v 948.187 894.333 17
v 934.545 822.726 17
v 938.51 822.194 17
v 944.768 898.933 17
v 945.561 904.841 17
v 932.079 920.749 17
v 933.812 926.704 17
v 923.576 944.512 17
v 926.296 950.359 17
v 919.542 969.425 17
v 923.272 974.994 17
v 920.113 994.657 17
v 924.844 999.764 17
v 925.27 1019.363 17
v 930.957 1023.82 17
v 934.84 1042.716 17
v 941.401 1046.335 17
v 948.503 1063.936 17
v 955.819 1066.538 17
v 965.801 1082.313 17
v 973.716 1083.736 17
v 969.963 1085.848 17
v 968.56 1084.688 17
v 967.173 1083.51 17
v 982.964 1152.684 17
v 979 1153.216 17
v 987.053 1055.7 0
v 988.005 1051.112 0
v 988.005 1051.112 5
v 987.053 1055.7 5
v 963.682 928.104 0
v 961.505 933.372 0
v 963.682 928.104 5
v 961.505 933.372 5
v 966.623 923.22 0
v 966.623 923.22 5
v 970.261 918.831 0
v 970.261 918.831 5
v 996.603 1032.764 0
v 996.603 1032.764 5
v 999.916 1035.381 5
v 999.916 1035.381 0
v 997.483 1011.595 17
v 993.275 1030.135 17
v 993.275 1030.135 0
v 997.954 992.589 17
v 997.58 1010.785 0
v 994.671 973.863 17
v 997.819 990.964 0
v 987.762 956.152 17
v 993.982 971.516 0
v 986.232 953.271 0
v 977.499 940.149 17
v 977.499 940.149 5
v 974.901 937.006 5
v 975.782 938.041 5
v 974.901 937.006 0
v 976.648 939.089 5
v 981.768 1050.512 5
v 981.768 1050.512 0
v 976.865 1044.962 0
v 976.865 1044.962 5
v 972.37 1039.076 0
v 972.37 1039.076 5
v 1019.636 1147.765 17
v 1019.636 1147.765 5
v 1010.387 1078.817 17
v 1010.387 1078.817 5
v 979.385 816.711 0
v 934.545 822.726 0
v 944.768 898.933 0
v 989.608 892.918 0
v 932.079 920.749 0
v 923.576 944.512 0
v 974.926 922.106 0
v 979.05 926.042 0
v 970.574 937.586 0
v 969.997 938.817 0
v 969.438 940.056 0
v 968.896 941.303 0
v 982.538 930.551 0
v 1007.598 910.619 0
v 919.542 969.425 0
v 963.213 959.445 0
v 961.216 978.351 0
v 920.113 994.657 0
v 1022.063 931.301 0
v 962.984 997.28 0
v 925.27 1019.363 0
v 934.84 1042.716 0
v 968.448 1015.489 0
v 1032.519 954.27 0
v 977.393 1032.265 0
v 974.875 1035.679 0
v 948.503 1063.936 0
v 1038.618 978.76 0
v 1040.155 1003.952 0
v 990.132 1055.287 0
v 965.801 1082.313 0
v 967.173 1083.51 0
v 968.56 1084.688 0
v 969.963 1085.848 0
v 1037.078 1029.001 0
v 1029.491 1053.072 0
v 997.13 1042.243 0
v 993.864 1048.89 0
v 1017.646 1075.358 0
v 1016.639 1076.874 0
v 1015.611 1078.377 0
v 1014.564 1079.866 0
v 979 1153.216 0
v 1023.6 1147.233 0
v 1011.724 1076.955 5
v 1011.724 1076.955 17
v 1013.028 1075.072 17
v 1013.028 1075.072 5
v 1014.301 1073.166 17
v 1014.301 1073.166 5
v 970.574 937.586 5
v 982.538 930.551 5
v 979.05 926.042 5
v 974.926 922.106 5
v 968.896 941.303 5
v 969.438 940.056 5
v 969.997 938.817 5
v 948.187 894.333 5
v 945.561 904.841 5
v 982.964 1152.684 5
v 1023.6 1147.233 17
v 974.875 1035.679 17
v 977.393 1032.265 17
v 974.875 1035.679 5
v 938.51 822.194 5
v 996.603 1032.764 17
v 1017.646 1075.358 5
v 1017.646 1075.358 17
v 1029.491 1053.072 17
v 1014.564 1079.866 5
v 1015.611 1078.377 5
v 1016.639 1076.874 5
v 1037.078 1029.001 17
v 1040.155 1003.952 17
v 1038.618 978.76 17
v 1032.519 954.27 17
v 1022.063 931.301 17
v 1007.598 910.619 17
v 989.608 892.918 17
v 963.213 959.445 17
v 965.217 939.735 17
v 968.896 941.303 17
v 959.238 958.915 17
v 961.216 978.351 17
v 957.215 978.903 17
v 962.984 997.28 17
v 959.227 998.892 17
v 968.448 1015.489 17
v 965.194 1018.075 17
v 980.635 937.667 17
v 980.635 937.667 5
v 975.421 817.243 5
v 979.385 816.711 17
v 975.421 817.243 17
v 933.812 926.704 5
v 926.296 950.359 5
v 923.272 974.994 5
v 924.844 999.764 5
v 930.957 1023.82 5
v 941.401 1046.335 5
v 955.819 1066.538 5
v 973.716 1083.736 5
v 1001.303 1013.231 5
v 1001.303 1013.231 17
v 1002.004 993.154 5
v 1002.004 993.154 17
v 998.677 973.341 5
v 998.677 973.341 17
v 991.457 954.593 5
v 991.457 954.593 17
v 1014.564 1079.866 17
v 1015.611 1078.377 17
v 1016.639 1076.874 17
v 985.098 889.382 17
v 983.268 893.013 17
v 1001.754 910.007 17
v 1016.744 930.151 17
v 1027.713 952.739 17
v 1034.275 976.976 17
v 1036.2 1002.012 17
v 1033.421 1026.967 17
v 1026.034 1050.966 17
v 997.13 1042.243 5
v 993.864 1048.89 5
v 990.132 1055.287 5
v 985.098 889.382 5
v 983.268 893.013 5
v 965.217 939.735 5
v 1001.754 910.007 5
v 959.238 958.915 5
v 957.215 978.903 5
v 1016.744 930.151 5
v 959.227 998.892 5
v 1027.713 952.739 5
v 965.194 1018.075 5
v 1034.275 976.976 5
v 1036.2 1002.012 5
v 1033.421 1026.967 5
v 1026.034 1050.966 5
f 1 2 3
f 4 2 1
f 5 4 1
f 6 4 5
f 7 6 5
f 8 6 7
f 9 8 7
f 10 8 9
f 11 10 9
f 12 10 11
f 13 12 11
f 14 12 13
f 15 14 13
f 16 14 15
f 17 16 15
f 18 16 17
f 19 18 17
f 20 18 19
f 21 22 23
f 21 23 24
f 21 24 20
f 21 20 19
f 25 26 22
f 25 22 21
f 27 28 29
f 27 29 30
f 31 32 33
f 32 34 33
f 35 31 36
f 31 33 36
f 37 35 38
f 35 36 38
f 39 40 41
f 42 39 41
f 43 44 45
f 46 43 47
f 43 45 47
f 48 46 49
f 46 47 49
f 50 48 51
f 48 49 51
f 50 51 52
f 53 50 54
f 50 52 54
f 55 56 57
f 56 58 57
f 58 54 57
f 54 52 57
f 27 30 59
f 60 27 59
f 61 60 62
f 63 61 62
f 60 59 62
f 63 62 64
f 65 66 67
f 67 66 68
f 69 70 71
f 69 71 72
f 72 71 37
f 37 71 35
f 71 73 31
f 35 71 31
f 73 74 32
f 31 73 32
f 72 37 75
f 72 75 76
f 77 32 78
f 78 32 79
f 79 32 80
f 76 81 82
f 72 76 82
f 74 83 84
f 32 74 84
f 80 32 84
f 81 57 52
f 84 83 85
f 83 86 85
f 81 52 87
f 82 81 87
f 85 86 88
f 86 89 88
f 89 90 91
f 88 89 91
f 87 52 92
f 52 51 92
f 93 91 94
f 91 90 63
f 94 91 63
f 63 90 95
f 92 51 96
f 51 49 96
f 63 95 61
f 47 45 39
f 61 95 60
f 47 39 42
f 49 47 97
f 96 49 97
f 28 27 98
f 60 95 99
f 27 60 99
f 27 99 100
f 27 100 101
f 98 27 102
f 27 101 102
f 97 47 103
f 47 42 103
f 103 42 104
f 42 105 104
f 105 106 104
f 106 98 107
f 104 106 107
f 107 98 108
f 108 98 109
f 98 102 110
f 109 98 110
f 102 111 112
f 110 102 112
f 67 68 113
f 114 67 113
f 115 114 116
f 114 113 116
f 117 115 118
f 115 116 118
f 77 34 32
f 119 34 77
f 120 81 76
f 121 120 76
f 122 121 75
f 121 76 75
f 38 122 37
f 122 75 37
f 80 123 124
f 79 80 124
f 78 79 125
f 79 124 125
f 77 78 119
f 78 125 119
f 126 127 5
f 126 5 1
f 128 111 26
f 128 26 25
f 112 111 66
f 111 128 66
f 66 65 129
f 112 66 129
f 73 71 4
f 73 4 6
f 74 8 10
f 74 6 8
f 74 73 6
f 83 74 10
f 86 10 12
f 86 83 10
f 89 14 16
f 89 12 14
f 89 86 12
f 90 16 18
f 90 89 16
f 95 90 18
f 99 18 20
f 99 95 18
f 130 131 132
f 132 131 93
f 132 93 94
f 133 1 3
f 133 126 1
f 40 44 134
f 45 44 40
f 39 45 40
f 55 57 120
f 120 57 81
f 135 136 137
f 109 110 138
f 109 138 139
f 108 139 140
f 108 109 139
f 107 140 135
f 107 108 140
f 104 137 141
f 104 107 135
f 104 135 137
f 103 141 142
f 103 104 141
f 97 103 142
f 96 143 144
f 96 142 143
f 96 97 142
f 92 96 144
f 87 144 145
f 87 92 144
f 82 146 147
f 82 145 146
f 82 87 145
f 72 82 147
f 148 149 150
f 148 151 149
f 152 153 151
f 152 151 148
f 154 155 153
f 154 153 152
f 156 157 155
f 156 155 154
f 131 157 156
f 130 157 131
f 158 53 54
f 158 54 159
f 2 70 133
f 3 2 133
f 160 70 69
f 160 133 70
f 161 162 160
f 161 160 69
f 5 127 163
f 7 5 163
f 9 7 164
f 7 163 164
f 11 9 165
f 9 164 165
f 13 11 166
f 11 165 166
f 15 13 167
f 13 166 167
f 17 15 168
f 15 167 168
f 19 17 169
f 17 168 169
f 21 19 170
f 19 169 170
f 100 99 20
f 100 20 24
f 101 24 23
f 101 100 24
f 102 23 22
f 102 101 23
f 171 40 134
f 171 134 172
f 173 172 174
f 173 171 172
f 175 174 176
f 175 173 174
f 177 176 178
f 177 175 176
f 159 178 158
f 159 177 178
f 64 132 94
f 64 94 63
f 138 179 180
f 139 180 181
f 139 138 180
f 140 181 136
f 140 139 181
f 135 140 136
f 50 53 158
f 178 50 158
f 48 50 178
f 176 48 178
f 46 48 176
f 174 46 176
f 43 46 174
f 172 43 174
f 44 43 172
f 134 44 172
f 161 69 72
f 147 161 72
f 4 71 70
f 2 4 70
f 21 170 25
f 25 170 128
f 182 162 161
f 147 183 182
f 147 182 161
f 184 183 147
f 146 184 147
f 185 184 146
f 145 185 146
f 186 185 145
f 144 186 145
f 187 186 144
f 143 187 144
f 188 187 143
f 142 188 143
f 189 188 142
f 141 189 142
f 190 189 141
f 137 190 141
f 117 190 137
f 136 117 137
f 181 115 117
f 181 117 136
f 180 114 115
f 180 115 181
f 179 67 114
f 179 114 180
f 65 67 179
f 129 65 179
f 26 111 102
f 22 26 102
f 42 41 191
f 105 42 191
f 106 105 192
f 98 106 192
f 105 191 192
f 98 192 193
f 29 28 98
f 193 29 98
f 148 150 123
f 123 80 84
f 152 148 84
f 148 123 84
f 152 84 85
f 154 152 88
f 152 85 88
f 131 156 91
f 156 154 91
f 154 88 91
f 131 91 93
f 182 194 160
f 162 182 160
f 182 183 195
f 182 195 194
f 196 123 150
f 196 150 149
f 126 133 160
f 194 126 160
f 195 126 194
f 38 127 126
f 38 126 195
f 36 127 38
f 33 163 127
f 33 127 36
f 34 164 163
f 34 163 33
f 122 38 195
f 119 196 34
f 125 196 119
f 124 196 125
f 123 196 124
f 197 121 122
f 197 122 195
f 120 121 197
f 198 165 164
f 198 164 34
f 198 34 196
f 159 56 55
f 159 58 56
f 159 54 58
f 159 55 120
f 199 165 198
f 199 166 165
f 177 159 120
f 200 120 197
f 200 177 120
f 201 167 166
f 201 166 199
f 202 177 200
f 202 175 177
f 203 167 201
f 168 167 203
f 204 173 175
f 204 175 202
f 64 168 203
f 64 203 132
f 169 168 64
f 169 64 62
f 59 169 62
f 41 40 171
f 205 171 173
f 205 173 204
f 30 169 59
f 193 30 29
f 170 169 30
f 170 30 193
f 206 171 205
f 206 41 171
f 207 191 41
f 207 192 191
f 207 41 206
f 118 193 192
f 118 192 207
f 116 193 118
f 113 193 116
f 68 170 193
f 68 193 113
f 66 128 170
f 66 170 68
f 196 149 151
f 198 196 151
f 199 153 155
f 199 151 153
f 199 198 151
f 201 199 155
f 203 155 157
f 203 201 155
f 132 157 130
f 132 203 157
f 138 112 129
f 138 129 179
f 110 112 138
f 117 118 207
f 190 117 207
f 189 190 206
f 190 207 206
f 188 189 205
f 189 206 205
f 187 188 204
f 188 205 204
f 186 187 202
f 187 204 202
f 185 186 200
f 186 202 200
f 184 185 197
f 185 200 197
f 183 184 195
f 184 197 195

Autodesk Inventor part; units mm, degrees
ref_plane "YZ Plane" through (0, 0, 0) normal (1, 0, 0) x (0, 1, 0)
ref_plane "XZ Plane" through (0, 0, 0) normal (0, 1, 0) x (-1, 0, 0)
ref_plane "XY Plane" through (0, 0, 0) normal (0, 0, 1) x (1, 0, 0)
sketch "Sketch1" plane through (0, 0, 0) normal (0, 0, 1) x (1, 0, 0)
  arc A0 (967.6192, 924.0732) -> (967.7873, 1075.2272) centre (902.2196, 999.723) ccw
  arc A1 (983.2683, 893.0126) -> (983.4428, 1106.3006) centre (902.2196, 999.723) ccw
  line L0 (965.7611, 927.7614) -> (985.0977, 889.3816)
  line L1 (966.6908, 925.9161) -> (1011.6908, 925.9161) construction
  arc A2 (985.0977, 889.3816) -> (985.2727, 1109.9327) centre (902.2196, 999.723) ccw
  line L2 (965.9281, 1071.5369) -> (985.2727, 1109.9327)
  arc A3 (965.7611, 927.7614) -> (965.9281, 1071.5369) centre (902.2196, 999.723) ccw
  line L3 (977.4986, 940.149) -> (980.6353, 937.6667)
  point P0 (0, 0)
  point P1 (983.9681, 893.1)
  point P2 (990.6031, 1100.4422)
  point P3 (968.1775, 1074.8866)
  dimension "d28" = 100
  dimension "d33" = 63.26
  dimension "d34" = 4
  dimension "d40" = 4
  dimension "d41" = 4
extrude "Extrusion6" add sketch "Sketch1" along normal blind 5
extrude "Extrusion7" add sketch "Sketch1" along normal blind 17 contours L3 A3 L2 A0 | A1 L2 A2 L0
sketch "Sketch5" plane through (0, 0, 5) normal (0, 0, 1) x (1, 0, 0)
  arc A0 (965.7611, 927.7614) -> (977.4986, 940.149) centre (902.2196, 999.723) ccw projected
  line L0 (965.7611, 927.7614) -> (970.2605, 918.8308)
  line L1 (965.7611, 927.7614) -> (983.2683, 893.0126) projected
  line L2 (977.4986, 940.149) -> (985.1361, 933.6938)
  arc A1 (965.7611, 927.7614) -> (977.4986, 940.149) centre (902.2196, 999.723) ccw
  arc A2 (965.7611, 927.7614) -> (974.9009, 937.006) centre (902.2196, 999.723) ccw
  line L3 (974.9009, 937.006) -> (982.5384, 930.5509)
  arc A3 (970.2605, 918.8308) -> (982.5384, 930.5509) centre (950.8165, 951.4915) ccw
  point P0 (0, 0)
  dimension "d42" = 10
  dimension "d43" = 10
  dimension "d46" = 13
  dimension "d47" = 10
extrude "Extrusion8" cut sketch "Sketch5" along normal through all both and the other way through all
sketch "Sketch6" plane through (0, 0, 5) normal (0, 0, 1) x (1, 0, 0)
  arc A0 (974.9009, 937.006) -> (965.9281, 1071.5369) centre (902.2196, 999.723) ccw projected
  arc A1 (985.0977, 889.3816) -> (985.2727, 1109.9327) centre (902.2196, 999.723) ccw projected
  line L0 (985.8441, 1046.8712) -> (1027.8759, 1046.8712) construction
  line L1 (985.2727, 1109.9327) -> (965.9281, 1071.5369) projected
  line L2 (965.9281, 1071.5369) -> (985.2727, 1109.9327)
  arc A2 (985.8441, 1046.8712) -> (965.9281, 1071.5369) centre (902.2196, 999.723) ccw
  arc A3 (1007.3627, 1089.1038) -> (985.2727, 1109.9327) centre (902.2196, 999.723) ccw
  line L3 (985.8441, 1046.8712) -> (1007.3627, 1089.1038)
  point P0 (0, 0)
  dimension "d51" = 63
extrude "Extrusion9" cut sketch "Sketch6" along normal through all both and the other way through all
sketch "Sketch7" plane through (0, 0, 5) normal (0, 0, 1) x (1, 0, 0)
  arc A0 (977.4782, 940.1232) -> (985.8441, 1046.8712) centre (902.2196, 999.723) ccw
  arc A1 (980.614, 937.6399) -> (988.005, 1051.1123) centre (902.2196, 999.723) ccw
  arc A2 (974.9009, 937.006) -> (985.8441, 1046.8712) centre (902.2196, 999.723) ccw projected
  line L0 (985.8441, 1046.8712) -> (988.005, 1051.1123)
  line L1 (985.8441, 1046.8712) -> (1007.3627, 1089.1038) projected
  line L2 (993.2753, 1030.1346) -> (996.6034, 1032.7639)
  point P0 (0, 0)
  dimension "d52" = 4
extrude "Extrusion10" cut sketch "Sketch7" along normal through all both and the other way through all
sketch "Sketch8" plane through (0, 0, 17) normal (0, 0, 1) x (1, 0, 0)
  arc A0 (983.2683, 893.0126) -> (1005.3901, 1085.2324) centre (902.2196, 999.723) ccw projected
  arc A1 (1014.3006, 1073.1658) -> (1005.3901, 1085.2324) centre (902.2196, 999.723) ccw
  line L0 (988.005, 1051.1123) -> (1007.3627, 1089.1038) projected
  line L1 (1005.3901, 1085.2324) -> (1007.3627, 1089.1038)
  line L2 (1014.3006, 1073.1658) -> (1017.6463, 1075.3581)
  arc A2 (985.0977, 889.3816) -> (1007.3627, 1089.1038) centre (902.2196, 999.723) ccw projected
  arc A3 (1017.6463, 1075.3581) -> (1007.3627, 1089.1038) centre (902.2196, 999.723) ccw
  point P0 (0, 0)
  dimension "d55" = 15
  dimension "d56" = 4
  dimension "d57" = 138
extrude "Extrusion11" cut sketch "Sketch8" against normal blind 12
sketch "Sketch10" plane through (0, 0, 5) normal (0, 0, 1) x (1, 0, 0)
  line L0 (993.2753, 1030.1346) -> (996.6034, 1032.7639) projected
  arc A0 (996.6034, 1032.7639) -> (988.005, 1051.1123) centre (902.2196, 999.723) ccw projected
  line L1 (988.005, 1051.1123) -> (1007.3627, 1089.1038) projected
  arc A1 (1017.6463, 1075.3581) -> (1007.3627, 1089.1038) centre (902.2196, 999.723) ccw projected
  line L2 (1014.3006, 1073.1658) -> (1017.6463, 1075.3581) projected
  arc A2 (983.2683, 893.0126) -> (1014.3006, 1073.1658) centre (902.2196, 999.723) ccw projected
  line L3 (983.2683, 893.0126) -> (970.2605, 918.8308) projected
  arc A3 (970.2605, 918.8308) -> (982.5384, 930.5509) centre (950.8165, 951.4915) ccw projected
  line L4 (982.5384, 930.5509) -> (974.9009, 937.006) projected
  arc A4 (974.9009, 937.006) -> (977.4986, 940.149) centre (902.2196, 999.723) ccw projected
  arc A5 (977.4986, 940.149) -> (993.2753, 1030.1346) centre (902.2196, 999.723) ccw projected
  arc A6 (980.6353, 937.6667) -> (996.6034, 1032.7639) centre (902.2196, 999.723) ccw projected
  line L5 (977.4986, 940.149) -> (980.6353, 937.6667) projected
  arc A7 (985.0977, 889.3816) -> (1017.6463, 1075.3581) centre (902.2196, 999.723) ccw projected
  line L6 (985.0977, 889.3816) -> (983.2683, 893.0126) projected
  line L7 (970.2605, 918.8308) -> (988.005, 1051.1123)
  line L8 (977.3926, 1032.2651) -> (974.8751, 1035.6786)
  arc A8 (988.005, 1051.1123) -> (974.8751, 1035.6786) centre (1057.2145, 978.9317) ccw
  line L9 (988.005, 1051.1123) -> (979.3441, 1092.8623)
  arc A9 (979.3441, 1092.8623) -> (965.8014, 1082.3127) centre (1057.2145, 978.9317) ccw
  line L10 (968.4511, 1079.3162) -> (965.8014, 1082.3127)
  arc A10 (973.7155, 1083.7358) -> (945.5606, 904.8412) centre (1057.2145, 978.9317) ccw
  line L11 (950.9084, 897.3534) -> (970.2605, 918.8308)
  arc A11 (961.5054, 933.3723) -> (970.2605, 918.8308) centre (997.6246, 945.2125) ccw
  line L12 (961.5054, 933.3723) -> (970.5741, 937.5864)
  arc A12 (968.8965, 941.3029) -> (970.5741, 937.5864) centre (1057.2145, 978.9317) ccw
  arc A13 (977.3926, 1032.2651) -> (968.8965, 941.3029) centre (1057.2145, 978.9317) ccw
  arc A14 (974.8751, 1035.6786) -> (965.2166, 939.735) centre (1057.2145, 978.9317) ccw
  line L13 (968.8965, 941.3029) -> (965.2166, 939.735)
  arc A15 (965.8014, 1082.3127) -> (948.1868, 894.3329) centre (1057.2145, 978.9317) ccw
  line L14 (948.1868, 894.3329) -> (950.9084, 897.3534)
  line L15 (970.2605, 918.8308) -> (948.1868, 894.3329)
  line L16 (970.2605, 918.8308) -> (985.0977, 889.3816)
  line L17 (985.0977, 889.3816) -> (975.4208, 817.2429)
  line L18 (948.1868, 894.3329) -> (938.5099, 822.1942)
  line L19 (945.5606, 904.8412) -> (934.5454, 822.726)
  line L20 (934.5454, 822.726) -> (979.3853, 816.7111)
  line L21 (979.3853, 816.7111) -> (990.4004, 898.8263)
  line L22 (945.5606, 904.8412) -> (948.1868, 894.3329)
  line L23 (985.0977, 889.3816) -> (990.4004, 898.8263)
  line L24 (988.005, 1051.1123) -> (1007.3627, 1089.1038) projected
  line L25 (988.005, 1051.1123) -> (979.3441, 1092.8623)
  line L26 (988.005, 1051.1123) -> (1007.3627, 1089.1038)
  line L27 (978.9999, 1153.216) -> (1023.6004, 1147.2332)
  line L28 (970.2605, 918.8308) -> (988.005, 1051.1123)
  line L29 (978.9999, 1153.216) -> (969.9631, 1085.8484)
  line L30 (1023.6004, 1147.2332) -> (1014.5636, 1079.8656)
  line L31 (973.7155, 1083.7358) -> (982.9644, 1152.6842)
  line L32 (1019.6359, 1147.765) -> (1010.3871, 1078.8166)
  arc A16 (990.4004, 898.8263) -> (1010.3871, 1078.8166) centre (902.2196, 999.723) ccw
  arc A17 (996.6034, 1032.7639) -> (988.005, 1051.1123) centre (902.2196, 999.723) ccw projected
  arc A18 (996.6034, 1032.7639) -> (988.005, 1051.1123) centre (902.2196, 999.723) ccw
  arc A19 (1000.3787, 1034.0856) -> (990.1322, 1055.2871) centre (902.2196, 999.723) ccw
  line L33 (993.2753, 1030.1346) -> (999.9157, 1035.3808)
  line L34 (988.005, 1051.1123) -> (990.1322, 1055.2871)
  arc A20 (988.005, 1051.1123) -> (974.8751, 1035.6786) centre (1057.2145, 978.9317) ccw
  line L35 (988.005, 1051.1123) -> (979.3441, 1092.8623)
  arc A21 (987.0533, 1055.7001) -> (971.5815, 1037.9485) centre (1057.2145, 978.9317) ccw
  line L36 (977.3926, 1032.2651) -> (972.3695, 1039.0759)
  point P0 (0, 0)
  point P1 (982.4326, 1148.7197)
  point P2 (1018.8217, 1141.6953)
  point P3 (980.2267, 1088.6079)
  point P4 (1005.3901, 1085.2324)
  point P5 (1011.1435, 1084.4555)
  point P6 (944.768, 898.933)
  point P7 (989.6079, 892.9181)
  point P8 (1001.3002, 1150.2246)
  point P9 (956.9654, 819.7185)
  dimension "d60" = 132.2815
  dimension "d61" = 4
  dimension "d62" = 4
  dimension "d64" = 45
  dimension "d65" = 22.5
  dimension "d66" = 4
  dimension "d74" = 100
  dimension "d75" = 100
  dimension "d76" = 4
extrude "Extrusion12" add sketch "Sketch10" against normal blind 5 contours L9 A9 L31 L27 L32 A1 L1 | A8 L36 A21 L9 | L3 L6 L17 L20 L18 L14 L11 | L11 L14 L22 A10 L31 A9 L9 A21 L36 A14 L13 A12 L12 A11
extrude "Extrusion13" add sketch "Sketch10" along normal blind 12 and the other way blind 5 contours L8 A13 L13 A14 | L32 L27 L30 A1 | A1 L2 A16 L32 | A7 L21 L20 L17 | L18 L20 L19 A15 | A15 L19 L22 | L31 A10 L10 A9 | A9 L29 L27 L31 | A15 L10 A10 L19
extrude "Extrusion14" cut sketch "Sketch10" against normal blind 12 contours A0 L1 A19 L33 | A8 L36 A21 L9
properties part number "outside3"
